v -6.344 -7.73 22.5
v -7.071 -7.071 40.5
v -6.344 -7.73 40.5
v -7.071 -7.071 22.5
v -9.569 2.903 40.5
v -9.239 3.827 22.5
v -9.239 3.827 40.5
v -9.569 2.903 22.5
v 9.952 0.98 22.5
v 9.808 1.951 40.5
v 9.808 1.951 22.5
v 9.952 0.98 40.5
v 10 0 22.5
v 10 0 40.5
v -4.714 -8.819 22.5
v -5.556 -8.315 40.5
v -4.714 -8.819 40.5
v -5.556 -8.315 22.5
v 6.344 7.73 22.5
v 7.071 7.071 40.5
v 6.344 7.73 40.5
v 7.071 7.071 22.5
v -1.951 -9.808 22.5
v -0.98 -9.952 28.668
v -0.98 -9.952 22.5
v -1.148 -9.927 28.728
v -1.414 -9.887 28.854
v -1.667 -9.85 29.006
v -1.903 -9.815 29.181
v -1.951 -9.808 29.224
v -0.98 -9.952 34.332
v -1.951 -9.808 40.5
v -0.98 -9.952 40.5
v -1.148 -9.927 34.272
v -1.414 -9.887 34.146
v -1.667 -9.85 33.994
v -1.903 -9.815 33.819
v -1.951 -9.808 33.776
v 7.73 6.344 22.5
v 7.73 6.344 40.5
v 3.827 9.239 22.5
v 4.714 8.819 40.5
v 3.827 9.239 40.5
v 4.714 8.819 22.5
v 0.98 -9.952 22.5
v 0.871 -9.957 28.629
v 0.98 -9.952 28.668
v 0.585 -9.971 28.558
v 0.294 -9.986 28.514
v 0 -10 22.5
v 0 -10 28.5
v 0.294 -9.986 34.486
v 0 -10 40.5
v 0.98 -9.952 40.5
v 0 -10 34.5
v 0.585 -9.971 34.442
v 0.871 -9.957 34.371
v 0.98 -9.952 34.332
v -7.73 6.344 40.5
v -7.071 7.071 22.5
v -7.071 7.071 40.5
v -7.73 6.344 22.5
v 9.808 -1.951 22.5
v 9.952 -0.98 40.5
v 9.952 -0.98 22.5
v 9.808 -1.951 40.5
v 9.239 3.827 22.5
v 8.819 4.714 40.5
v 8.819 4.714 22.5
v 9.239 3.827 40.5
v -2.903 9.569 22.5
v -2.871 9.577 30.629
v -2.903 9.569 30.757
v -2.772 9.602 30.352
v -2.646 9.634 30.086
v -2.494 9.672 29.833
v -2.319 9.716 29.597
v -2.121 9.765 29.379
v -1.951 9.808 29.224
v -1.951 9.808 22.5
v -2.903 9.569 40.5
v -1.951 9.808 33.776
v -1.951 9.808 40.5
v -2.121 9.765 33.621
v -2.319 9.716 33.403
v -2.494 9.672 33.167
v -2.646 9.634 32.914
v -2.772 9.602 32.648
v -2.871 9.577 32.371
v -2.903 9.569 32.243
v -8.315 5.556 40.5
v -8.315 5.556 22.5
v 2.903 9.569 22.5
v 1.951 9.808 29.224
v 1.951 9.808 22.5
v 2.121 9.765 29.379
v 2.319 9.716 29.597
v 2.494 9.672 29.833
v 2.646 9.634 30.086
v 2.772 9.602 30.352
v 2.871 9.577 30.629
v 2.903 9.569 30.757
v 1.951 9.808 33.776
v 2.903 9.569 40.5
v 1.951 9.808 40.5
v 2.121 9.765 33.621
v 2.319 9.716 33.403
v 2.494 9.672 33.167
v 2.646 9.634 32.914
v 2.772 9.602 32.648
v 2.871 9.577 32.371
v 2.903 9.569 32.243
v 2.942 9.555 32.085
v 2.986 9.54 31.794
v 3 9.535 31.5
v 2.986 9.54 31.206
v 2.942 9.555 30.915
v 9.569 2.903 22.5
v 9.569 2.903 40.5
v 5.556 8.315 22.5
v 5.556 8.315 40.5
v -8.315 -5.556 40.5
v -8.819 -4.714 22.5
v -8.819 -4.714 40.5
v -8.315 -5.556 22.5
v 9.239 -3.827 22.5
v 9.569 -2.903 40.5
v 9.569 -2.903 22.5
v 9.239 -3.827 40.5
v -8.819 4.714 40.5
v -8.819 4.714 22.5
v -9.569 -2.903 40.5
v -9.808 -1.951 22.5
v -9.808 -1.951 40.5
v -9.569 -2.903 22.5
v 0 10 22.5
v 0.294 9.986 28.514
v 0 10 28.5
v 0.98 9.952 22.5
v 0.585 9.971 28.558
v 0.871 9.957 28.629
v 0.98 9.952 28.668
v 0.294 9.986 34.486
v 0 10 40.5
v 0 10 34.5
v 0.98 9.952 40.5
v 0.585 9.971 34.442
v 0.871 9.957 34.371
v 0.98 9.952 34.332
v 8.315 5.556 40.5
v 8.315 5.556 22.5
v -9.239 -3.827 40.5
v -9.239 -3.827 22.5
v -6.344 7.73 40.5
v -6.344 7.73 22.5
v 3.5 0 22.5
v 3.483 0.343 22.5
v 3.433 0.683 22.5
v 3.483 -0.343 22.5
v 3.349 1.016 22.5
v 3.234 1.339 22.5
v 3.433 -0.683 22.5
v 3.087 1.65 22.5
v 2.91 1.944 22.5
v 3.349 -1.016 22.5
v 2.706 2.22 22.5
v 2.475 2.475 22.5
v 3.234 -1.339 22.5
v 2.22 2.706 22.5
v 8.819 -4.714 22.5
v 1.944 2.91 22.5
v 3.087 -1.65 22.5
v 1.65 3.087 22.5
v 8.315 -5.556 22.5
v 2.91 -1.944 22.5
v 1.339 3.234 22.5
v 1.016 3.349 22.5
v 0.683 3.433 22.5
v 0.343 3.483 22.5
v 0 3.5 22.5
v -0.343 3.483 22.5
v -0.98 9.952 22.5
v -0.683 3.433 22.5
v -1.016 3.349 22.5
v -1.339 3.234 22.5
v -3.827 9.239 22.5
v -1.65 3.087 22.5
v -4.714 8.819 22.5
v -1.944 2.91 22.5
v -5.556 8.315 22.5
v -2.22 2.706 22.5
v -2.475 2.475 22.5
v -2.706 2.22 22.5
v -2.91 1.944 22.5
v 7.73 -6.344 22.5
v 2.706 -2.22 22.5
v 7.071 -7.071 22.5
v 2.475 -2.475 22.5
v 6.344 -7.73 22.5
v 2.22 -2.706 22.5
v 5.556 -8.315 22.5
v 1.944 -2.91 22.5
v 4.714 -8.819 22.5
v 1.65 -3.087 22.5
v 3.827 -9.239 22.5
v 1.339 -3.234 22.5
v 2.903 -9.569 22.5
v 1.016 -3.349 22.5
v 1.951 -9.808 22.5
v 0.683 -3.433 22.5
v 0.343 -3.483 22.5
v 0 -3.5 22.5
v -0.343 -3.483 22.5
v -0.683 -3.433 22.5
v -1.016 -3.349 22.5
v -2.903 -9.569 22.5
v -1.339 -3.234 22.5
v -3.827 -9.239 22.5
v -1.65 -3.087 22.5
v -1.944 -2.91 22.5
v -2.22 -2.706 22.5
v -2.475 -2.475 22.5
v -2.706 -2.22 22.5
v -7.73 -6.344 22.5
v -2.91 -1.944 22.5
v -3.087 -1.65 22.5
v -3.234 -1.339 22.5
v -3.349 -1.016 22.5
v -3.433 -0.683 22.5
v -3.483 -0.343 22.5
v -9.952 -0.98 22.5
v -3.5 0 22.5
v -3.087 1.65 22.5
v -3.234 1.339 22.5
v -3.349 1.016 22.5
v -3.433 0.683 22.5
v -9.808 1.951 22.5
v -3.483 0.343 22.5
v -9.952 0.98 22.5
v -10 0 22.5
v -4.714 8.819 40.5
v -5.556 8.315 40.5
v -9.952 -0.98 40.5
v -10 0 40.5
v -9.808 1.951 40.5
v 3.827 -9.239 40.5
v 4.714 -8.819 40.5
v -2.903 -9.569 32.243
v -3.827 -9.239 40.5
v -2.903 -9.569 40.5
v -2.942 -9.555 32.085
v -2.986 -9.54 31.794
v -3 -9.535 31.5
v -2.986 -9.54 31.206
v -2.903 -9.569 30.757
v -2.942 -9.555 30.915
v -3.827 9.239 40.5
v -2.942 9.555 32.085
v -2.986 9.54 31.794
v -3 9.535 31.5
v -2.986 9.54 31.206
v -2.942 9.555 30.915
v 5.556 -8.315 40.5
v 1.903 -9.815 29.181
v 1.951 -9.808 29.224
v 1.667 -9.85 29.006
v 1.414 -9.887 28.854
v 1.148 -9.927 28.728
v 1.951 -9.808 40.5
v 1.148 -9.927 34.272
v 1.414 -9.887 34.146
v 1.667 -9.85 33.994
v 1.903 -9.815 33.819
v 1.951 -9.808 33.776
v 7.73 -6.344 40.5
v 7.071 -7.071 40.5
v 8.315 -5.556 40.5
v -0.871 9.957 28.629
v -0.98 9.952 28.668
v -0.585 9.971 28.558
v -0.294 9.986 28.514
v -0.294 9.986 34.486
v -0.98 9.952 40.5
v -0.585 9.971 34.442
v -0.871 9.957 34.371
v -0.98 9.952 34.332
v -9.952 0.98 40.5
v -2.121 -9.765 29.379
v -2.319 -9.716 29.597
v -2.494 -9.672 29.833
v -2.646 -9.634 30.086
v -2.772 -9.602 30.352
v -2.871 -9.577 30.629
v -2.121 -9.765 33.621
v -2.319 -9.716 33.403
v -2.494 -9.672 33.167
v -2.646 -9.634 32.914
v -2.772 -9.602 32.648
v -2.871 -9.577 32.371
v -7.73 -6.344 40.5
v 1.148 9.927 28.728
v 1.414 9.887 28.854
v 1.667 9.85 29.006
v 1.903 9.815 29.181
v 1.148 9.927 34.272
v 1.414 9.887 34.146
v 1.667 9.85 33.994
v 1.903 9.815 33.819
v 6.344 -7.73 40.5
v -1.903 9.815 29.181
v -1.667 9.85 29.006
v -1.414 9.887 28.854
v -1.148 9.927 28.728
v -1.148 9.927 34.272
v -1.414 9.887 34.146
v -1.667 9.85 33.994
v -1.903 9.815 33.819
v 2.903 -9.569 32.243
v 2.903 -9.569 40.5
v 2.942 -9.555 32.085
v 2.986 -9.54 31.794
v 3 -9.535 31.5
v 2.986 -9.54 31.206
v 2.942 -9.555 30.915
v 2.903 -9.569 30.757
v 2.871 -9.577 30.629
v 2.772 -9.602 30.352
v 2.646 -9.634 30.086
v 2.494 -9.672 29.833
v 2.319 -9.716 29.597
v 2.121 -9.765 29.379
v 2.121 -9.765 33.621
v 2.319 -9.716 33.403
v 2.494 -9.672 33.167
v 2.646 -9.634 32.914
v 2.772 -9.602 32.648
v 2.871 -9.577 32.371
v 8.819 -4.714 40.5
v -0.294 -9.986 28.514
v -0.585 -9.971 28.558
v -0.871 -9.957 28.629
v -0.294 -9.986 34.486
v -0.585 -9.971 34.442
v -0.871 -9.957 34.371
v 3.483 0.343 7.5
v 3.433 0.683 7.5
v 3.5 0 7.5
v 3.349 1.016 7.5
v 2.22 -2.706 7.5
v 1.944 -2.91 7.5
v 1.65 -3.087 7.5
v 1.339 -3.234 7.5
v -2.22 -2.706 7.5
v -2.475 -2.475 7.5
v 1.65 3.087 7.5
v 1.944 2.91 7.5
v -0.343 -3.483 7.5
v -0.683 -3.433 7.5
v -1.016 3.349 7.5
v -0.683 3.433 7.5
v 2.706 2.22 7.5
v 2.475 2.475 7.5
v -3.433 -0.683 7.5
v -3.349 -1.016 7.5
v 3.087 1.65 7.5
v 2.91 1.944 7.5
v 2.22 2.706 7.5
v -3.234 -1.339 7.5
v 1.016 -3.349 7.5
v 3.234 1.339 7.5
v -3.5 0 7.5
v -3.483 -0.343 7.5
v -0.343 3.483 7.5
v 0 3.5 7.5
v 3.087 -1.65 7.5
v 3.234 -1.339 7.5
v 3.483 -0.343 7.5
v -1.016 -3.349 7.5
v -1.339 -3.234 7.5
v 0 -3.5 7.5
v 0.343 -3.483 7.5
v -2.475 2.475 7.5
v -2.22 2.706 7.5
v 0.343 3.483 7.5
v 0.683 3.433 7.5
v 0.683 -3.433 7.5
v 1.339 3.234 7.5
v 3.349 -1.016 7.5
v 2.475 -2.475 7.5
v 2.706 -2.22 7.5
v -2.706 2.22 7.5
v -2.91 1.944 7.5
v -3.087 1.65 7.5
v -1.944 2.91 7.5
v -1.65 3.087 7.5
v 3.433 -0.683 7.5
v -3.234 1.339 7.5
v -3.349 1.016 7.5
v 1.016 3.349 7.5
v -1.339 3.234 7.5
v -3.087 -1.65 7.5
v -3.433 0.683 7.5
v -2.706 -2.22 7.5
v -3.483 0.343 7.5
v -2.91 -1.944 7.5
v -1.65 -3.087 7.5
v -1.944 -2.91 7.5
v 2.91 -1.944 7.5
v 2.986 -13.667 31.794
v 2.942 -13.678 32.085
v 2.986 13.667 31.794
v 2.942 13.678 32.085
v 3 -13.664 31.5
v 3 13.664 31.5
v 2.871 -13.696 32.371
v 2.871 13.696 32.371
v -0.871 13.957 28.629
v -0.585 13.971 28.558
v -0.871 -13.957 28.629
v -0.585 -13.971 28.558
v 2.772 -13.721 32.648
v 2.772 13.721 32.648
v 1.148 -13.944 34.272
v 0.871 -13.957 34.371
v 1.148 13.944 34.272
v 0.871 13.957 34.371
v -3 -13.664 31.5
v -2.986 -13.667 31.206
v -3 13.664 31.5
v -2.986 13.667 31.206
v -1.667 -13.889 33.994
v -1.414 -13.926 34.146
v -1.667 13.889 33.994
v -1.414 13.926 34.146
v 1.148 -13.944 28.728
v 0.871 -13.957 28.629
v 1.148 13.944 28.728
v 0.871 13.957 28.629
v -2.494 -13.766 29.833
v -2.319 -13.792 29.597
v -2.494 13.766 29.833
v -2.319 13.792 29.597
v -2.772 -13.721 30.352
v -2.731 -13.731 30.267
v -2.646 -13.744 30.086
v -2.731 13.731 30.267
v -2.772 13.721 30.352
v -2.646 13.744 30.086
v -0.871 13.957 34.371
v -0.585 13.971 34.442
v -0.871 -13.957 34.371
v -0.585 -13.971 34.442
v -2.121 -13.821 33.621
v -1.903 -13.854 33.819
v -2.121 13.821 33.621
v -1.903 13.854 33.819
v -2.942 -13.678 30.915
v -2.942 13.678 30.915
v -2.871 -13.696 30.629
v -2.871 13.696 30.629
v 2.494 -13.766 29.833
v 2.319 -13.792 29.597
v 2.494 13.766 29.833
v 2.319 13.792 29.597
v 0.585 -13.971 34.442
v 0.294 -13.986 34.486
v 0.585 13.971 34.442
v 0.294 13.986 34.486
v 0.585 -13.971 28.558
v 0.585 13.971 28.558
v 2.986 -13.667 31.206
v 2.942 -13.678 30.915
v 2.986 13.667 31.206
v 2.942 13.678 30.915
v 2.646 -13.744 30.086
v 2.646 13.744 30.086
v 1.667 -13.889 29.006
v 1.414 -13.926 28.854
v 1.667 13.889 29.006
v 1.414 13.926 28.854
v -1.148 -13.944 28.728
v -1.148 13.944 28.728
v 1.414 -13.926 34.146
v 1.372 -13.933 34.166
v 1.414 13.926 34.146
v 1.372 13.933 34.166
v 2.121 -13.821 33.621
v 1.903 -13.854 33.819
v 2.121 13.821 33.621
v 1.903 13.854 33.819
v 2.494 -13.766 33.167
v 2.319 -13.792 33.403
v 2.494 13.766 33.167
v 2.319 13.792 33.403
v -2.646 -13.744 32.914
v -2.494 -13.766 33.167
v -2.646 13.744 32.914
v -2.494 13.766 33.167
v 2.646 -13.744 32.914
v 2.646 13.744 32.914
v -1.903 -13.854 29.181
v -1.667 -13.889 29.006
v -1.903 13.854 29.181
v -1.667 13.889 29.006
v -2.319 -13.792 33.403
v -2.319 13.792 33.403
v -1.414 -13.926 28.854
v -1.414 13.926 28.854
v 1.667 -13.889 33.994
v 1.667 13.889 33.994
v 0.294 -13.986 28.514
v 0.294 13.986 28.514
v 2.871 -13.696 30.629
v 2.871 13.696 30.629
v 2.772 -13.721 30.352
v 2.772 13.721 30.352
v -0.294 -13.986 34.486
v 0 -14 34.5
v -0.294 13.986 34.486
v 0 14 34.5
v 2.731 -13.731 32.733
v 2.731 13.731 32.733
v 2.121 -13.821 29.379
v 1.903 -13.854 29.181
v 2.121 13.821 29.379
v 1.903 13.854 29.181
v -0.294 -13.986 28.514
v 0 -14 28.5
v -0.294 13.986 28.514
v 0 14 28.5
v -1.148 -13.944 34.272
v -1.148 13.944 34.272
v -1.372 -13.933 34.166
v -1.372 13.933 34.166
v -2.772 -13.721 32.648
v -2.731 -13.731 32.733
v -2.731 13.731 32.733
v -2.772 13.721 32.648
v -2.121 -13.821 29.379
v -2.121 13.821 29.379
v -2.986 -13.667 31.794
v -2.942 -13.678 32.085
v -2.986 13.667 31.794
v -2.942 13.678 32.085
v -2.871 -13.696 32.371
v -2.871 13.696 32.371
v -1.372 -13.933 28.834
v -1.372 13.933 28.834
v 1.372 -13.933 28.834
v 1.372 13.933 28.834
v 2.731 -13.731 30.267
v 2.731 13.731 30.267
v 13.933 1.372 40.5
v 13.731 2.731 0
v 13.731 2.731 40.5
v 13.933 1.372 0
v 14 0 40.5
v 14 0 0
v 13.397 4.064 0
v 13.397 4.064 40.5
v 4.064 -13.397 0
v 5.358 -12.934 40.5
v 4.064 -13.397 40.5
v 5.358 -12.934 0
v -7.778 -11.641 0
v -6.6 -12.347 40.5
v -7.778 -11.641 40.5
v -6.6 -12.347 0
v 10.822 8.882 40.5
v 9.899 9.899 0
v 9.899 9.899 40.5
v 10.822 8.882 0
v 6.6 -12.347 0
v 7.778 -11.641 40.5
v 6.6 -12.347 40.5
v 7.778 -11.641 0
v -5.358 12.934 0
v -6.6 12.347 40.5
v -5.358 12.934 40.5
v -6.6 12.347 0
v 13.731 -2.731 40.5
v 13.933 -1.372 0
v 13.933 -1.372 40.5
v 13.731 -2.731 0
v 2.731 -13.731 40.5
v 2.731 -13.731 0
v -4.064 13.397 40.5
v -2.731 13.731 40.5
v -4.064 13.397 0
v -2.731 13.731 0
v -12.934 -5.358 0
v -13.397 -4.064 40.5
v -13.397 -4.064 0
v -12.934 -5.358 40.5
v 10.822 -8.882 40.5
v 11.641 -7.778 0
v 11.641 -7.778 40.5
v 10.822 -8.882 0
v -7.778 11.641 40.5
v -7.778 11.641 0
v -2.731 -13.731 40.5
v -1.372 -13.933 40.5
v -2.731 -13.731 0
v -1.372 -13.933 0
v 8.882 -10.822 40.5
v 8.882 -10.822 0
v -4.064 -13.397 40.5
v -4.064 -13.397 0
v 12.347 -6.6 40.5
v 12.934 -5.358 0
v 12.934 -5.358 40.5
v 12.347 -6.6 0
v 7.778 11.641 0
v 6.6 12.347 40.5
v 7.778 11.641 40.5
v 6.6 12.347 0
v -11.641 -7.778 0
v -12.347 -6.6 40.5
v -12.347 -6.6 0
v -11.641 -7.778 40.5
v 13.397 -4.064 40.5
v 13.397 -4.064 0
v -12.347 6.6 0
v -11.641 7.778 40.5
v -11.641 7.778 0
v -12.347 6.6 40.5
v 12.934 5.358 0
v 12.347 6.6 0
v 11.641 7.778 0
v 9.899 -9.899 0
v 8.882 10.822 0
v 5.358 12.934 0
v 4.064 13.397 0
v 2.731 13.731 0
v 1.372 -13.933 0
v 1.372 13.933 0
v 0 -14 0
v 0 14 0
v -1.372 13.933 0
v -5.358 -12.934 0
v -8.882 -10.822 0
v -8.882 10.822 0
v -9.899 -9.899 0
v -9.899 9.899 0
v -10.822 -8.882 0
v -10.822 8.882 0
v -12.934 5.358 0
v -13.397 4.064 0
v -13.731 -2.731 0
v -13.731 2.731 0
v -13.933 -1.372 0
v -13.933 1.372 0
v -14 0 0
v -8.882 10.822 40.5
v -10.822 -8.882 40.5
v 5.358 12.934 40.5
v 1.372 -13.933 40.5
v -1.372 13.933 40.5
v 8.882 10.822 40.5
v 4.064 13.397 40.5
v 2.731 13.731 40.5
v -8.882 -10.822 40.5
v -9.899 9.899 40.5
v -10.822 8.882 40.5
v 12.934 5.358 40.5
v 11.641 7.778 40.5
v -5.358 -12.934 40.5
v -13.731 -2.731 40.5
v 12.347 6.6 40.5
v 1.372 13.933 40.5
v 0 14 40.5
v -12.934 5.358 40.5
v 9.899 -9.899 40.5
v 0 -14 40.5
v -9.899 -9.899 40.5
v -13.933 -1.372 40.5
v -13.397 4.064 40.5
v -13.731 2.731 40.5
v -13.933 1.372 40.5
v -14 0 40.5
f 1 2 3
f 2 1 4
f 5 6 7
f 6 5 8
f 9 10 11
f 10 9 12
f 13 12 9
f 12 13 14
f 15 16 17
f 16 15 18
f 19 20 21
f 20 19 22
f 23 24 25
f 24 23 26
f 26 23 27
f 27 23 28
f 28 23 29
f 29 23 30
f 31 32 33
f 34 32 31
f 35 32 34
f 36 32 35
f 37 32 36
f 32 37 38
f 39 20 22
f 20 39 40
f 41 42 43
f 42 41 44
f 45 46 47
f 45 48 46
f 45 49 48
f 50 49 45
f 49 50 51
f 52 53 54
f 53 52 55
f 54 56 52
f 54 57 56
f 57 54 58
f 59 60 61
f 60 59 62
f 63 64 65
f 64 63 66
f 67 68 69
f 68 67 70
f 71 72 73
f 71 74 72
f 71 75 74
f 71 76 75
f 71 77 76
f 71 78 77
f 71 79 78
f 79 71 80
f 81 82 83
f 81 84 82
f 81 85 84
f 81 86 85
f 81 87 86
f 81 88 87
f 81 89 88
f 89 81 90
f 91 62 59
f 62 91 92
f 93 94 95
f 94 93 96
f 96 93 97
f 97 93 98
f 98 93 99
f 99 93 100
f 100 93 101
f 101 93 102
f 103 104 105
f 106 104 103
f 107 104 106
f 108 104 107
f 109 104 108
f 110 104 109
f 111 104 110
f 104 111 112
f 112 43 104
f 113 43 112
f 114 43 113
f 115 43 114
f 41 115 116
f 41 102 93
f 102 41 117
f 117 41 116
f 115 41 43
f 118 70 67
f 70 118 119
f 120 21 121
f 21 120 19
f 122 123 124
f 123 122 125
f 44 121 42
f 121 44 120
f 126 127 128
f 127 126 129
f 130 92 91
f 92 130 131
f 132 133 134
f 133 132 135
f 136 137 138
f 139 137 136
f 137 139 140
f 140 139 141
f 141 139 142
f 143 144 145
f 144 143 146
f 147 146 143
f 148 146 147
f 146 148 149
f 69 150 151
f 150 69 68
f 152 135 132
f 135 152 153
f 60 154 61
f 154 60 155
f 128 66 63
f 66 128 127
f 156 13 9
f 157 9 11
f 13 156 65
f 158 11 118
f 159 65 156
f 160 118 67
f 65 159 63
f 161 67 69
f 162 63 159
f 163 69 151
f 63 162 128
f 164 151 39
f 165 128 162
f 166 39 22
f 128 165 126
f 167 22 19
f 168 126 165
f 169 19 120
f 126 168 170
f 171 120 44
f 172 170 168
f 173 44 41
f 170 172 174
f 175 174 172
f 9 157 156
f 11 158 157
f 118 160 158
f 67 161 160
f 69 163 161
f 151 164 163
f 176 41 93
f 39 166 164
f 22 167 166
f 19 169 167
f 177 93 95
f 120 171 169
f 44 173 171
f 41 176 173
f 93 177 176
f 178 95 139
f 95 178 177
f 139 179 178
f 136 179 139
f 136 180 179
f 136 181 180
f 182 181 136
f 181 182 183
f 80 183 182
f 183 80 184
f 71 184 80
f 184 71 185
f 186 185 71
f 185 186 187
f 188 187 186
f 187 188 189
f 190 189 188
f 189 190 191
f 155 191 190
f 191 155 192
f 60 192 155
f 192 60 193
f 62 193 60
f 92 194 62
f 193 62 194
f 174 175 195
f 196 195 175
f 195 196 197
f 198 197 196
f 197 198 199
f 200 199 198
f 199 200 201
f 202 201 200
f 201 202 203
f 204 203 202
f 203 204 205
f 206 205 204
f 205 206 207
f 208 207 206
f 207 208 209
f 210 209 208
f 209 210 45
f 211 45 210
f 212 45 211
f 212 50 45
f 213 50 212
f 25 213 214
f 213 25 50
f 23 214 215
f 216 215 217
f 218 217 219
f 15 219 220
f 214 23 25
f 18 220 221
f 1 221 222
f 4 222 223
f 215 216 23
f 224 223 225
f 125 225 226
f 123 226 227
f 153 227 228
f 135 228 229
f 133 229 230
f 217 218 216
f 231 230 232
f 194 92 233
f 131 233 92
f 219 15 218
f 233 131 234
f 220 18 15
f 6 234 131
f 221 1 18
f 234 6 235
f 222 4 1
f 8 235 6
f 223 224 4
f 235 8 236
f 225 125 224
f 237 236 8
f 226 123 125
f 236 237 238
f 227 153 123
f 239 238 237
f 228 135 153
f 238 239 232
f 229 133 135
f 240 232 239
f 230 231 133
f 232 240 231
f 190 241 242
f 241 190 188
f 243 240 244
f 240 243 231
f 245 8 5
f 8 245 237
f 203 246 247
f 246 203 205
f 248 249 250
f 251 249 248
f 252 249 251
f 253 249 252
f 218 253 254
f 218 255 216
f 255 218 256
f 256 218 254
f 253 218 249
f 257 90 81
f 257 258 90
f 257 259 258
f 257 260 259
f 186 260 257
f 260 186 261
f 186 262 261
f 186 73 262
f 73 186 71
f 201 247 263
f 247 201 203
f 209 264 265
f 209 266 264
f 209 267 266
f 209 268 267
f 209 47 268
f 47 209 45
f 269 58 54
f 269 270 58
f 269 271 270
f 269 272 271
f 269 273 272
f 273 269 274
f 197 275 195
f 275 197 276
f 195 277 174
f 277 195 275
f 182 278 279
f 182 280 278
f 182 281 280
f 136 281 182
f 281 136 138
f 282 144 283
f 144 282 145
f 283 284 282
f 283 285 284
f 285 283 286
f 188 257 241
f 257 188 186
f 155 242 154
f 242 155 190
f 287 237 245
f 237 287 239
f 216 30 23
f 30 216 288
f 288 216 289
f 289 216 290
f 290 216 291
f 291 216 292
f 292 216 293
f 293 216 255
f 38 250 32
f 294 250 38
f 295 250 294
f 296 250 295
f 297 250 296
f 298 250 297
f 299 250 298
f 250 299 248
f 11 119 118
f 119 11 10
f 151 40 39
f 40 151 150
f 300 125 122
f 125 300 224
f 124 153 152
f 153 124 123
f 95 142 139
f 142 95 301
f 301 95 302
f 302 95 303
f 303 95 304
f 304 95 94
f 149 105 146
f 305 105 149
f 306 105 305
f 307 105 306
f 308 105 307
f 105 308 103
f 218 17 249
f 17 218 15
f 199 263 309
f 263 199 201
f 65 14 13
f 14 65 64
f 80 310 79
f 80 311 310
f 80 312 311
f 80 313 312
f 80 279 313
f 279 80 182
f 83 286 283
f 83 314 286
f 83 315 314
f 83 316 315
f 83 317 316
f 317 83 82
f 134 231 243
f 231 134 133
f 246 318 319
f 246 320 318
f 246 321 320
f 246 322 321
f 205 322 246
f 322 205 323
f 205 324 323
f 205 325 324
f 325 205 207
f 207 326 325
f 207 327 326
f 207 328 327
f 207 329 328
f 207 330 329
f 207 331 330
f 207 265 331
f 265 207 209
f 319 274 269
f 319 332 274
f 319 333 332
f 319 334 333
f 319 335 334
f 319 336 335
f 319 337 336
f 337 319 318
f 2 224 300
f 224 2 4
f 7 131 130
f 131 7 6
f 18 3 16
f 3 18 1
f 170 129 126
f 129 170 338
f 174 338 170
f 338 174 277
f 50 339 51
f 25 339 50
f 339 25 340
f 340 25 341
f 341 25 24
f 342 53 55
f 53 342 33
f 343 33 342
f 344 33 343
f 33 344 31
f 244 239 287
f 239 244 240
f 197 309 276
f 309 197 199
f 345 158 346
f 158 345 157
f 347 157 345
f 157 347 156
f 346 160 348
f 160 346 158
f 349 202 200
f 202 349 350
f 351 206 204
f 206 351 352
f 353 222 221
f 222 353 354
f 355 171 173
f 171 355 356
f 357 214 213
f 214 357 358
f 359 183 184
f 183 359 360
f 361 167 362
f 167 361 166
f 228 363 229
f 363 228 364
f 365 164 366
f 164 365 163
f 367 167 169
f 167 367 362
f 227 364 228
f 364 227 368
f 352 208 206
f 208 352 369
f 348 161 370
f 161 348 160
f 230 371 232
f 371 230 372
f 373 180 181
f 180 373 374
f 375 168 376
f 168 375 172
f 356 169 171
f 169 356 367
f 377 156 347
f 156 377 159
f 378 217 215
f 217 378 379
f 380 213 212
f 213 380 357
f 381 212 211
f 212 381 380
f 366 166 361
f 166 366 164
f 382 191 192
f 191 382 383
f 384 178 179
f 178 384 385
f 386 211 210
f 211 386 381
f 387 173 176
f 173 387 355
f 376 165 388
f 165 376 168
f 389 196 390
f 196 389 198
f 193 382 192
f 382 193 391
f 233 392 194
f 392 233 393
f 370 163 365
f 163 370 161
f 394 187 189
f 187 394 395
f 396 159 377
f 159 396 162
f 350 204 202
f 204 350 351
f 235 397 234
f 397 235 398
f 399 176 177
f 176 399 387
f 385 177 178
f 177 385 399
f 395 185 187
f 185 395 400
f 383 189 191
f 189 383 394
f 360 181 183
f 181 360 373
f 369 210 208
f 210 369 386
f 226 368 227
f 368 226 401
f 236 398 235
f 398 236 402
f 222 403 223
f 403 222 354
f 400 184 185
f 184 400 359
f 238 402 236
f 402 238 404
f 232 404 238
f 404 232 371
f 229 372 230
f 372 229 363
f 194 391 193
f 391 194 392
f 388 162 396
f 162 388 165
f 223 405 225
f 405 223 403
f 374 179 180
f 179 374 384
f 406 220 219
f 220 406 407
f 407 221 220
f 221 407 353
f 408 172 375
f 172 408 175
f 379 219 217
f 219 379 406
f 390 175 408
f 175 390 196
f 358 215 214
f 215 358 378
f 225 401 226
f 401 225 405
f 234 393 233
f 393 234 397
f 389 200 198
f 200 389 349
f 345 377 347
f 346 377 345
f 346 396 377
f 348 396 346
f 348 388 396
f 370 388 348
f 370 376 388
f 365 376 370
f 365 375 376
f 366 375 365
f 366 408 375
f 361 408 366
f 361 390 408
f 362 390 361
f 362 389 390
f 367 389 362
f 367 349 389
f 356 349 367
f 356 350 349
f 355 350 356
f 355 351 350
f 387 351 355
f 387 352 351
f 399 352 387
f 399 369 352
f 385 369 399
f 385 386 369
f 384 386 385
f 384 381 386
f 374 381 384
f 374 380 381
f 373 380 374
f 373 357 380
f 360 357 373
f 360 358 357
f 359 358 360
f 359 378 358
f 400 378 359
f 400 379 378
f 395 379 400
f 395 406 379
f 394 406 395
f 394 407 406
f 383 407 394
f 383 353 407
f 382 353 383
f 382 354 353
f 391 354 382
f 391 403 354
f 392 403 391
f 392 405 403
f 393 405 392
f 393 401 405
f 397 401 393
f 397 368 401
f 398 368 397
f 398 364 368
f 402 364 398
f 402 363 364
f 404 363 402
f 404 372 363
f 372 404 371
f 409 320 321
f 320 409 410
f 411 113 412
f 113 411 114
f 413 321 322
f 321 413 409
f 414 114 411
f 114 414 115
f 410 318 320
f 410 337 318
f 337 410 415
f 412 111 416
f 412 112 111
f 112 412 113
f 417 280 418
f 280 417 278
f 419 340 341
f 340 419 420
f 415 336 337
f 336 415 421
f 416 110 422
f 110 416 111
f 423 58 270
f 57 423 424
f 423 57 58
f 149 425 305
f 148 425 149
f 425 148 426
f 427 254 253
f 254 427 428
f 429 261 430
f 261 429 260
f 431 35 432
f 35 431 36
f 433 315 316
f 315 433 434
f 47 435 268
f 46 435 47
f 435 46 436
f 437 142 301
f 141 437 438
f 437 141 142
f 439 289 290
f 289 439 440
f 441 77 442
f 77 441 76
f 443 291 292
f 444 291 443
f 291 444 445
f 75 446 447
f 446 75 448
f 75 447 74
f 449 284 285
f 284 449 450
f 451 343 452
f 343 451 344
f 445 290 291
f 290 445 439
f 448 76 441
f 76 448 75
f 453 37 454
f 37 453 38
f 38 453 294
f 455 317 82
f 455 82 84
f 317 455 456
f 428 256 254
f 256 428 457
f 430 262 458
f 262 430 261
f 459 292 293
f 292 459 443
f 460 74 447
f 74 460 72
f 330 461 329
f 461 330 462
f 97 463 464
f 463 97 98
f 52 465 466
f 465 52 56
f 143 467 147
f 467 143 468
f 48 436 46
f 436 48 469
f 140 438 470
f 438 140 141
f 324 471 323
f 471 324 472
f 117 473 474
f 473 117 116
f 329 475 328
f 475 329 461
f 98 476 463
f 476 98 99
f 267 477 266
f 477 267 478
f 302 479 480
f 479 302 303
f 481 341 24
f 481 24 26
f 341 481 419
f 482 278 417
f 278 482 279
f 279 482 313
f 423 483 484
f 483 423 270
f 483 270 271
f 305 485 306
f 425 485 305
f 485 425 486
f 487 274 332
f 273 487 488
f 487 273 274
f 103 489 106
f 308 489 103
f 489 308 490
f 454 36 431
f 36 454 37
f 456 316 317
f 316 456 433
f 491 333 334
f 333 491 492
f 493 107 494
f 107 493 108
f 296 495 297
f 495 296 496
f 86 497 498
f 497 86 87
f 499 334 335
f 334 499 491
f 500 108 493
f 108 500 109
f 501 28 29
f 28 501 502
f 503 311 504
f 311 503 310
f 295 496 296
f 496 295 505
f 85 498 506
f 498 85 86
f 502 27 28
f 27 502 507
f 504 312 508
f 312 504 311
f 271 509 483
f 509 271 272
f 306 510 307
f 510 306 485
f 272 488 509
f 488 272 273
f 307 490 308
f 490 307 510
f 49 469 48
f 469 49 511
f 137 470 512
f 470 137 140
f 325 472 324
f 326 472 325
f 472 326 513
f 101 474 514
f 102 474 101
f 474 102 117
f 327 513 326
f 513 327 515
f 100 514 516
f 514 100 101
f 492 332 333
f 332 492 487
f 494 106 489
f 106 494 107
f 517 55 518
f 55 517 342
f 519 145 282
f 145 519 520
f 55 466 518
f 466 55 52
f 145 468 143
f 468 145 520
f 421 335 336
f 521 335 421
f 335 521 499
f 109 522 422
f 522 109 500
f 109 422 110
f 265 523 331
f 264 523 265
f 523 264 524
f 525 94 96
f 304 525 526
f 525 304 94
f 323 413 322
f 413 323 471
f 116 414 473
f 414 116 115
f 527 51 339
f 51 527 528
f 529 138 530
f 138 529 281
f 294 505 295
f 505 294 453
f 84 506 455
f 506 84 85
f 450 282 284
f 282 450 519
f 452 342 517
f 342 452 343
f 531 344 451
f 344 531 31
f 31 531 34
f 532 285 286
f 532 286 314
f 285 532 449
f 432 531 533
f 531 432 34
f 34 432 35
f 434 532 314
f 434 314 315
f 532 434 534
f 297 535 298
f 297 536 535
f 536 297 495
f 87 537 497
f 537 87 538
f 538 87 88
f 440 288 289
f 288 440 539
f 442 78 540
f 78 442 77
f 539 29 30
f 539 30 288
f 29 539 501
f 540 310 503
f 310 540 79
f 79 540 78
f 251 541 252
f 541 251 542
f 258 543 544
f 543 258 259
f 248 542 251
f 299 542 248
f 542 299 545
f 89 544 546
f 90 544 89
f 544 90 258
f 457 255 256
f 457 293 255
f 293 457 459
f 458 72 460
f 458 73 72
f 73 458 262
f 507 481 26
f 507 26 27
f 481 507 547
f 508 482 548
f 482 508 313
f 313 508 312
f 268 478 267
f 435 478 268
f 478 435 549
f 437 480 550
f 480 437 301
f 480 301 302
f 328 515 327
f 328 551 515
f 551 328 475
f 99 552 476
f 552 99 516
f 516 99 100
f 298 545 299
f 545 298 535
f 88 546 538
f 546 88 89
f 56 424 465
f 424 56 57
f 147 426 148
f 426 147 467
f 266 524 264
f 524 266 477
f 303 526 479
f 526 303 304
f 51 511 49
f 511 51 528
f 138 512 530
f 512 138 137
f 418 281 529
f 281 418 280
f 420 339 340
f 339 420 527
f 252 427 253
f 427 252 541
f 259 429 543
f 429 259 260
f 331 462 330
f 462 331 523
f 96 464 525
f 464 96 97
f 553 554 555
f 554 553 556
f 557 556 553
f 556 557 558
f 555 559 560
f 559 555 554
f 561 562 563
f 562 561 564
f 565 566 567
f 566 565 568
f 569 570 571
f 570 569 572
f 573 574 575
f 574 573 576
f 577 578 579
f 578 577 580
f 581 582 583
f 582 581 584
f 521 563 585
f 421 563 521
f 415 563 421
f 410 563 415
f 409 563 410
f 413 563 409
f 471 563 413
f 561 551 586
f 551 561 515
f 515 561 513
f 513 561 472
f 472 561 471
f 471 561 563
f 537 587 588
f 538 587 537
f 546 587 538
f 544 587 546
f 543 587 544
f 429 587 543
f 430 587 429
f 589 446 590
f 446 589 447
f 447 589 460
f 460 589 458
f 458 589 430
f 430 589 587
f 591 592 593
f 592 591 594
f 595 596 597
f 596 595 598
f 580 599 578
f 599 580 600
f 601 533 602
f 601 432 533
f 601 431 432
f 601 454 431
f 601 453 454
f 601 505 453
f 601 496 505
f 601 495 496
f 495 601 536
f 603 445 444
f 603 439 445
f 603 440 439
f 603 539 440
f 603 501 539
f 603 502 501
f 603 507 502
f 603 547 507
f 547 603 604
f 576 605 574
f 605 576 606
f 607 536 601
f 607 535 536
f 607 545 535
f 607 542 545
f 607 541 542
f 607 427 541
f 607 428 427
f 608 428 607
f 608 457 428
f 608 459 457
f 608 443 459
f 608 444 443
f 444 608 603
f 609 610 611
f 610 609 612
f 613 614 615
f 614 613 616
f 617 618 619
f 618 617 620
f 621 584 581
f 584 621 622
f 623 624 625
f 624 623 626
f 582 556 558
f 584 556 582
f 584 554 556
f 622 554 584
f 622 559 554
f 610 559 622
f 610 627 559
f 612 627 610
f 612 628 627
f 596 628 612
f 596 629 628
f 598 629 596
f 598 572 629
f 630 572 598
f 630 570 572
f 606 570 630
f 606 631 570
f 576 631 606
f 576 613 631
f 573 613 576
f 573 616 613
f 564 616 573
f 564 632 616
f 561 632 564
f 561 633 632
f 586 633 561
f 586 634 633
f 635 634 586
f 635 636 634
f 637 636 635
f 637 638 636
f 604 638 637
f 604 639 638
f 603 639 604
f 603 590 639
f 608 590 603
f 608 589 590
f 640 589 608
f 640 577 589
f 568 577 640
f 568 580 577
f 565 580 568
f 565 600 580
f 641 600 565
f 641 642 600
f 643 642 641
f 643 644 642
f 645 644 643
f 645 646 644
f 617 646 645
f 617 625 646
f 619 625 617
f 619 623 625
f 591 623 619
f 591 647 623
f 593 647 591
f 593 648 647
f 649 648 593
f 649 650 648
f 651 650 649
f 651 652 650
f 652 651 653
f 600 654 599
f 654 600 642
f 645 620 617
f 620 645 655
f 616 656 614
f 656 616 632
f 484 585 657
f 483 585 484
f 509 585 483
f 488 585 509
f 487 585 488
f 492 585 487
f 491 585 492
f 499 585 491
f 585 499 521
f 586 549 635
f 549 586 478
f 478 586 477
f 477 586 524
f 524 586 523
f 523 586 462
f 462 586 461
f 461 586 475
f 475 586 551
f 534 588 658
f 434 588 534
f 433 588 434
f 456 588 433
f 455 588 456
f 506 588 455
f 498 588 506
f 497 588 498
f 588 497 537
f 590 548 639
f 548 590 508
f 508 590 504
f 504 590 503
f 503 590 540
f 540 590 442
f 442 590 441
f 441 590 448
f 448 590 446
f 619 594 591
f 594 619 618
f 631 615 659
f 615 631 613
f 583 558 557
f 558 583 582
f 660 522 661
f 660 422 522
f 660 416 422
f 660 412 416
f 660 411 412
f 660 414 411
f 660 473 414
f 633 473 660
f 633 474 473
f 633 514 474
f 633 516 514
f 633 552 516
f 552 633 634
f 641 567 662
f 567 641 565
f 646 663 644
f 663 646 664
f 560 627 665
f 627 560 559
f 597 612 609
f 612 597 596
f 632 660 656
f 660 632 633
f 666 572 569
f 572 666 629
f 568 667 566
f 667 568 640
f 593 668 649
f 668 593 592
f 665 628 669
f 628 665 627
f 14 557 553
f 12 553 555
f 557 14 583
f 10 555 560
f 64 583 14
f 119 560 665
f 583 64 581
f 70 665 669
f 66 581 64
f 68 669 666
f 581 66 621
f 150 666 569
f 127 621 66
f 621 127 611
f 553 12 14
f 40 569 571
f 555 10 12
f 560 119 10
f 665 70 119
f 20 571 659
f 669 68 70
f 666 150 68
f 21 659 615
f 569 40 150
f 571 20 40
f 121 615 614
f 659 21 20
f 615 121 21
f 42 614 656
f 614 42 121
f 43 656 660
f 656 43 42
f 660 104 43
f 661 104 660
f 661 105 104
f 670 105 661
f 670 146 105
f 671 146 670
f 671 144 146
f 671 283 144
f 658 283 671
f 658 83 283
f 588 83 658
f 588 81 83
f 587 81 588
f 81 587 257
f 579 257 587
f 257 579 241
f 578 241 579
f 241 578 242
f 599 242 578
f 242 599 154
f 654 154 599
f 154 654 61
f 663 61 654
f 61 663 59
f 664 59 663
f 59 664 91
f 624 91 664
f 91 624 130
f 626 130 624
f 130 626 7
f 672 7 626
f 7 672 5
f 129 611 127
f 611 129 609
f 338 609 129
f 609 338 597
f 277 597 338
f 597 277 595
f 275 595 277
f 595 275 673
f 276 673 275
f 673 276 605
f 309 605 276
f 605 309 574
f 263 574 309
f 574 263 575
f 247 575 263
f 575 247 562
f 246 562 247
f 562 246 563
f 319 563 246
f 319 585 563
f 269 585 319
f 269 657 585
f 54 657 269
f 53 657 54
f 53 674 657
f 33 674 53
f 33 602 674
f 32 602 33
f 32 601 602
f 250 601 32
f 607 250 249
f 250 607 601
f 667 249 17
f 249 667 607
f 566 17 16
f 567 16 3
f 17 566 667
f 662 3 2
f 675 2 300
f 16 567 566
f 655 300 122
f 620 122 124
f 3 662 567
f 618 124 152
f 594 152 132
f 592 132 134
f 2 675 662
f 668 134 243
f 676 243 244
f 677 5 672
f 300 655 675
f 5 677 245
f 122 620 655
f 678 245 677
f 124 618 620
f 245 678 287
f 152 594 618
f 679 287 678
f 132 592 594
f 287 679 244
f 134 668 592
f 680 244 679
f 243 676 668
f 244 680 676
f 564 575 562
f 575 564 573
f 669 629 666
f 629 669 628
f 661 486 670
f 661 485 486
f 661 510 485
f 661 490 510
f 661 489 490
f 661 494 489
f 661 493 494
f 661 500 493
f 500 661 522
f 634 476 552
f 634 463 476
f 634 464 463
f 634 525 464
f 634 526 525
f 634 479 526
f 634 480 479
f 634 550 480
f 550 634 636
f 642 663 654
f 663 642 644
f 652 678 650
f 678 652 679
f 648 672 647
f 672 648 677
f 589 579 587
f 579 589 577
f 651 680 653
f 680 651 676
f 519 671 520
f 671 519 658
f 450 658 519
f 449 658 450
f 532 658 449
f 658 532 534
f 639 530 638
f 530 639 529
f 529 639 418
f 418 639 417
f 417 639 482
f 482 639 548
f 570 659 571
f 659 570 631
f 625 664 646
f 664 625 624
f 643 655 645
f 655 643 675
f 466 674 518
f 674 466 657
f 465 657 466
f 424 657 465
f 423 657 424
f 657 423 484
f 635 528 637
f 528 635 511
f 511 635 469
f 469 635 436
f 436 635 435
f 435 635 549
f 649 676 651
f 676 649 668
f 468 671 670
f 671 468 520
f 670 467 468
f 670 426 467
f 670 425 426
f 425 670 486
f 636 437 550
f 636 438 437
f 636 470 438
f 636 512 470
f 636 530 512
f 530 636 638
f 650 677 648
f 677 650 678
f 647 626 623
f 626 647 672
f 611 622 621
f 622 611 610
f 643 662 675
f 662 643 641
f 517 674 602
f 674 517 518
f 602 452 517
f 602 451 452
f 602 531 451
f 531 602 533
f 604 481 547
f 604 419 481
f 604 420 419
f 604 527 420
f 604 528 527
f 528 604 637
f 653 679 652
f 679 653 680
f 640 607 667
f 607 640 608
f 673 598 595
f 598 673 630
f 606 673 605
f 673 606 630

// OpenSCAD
// 9mm (kante <-> mitte loch); d=6
// Height distance pin (Polsternagel)
pinheight=7.5;

// diameter & height of linear actuator shaft 
shaftdiam = 20;
shaftheight = 18;
shaftdistancethroughhole = 9;
throughholediam = 6;

// diameter & height of magnet to hold distance pin
magnetdiam=7;
magnetheight=15;
// length of spring above magnet
springheight=0; // no spring
magnetshaftstart=pinheight;

// acumulated height of tool
toolheight=pinheight+magnetheight+springheight+shaftheight;
tooldiam=28;

difference() {
    cylinder(h=toolheight, d=tooldiam, $fn=64);
    union () {
        // shaft for attachment to linear actuator
        translate([0,0,magnetshaftstart+magnetheight+springheight]) cylinder(h=toolheight, d=shaftdiam, $fn=64);
        // shaft for magnet and spring
        translate([0,0,magnetshaftstart]) cylinder(h=magnetheight+springheight+0.1, d=magnetdiam, $fn=64);
        translate([0,0,magnetshaftstart+magnetheight+springheight+shaftdistancethroughhole])  rotate([90,0,0]) cylinder(d=throughholediam, h=1.2*tooldiam, center=true, $fn=64);
    }
}

// TODO: model and substract distance pin
